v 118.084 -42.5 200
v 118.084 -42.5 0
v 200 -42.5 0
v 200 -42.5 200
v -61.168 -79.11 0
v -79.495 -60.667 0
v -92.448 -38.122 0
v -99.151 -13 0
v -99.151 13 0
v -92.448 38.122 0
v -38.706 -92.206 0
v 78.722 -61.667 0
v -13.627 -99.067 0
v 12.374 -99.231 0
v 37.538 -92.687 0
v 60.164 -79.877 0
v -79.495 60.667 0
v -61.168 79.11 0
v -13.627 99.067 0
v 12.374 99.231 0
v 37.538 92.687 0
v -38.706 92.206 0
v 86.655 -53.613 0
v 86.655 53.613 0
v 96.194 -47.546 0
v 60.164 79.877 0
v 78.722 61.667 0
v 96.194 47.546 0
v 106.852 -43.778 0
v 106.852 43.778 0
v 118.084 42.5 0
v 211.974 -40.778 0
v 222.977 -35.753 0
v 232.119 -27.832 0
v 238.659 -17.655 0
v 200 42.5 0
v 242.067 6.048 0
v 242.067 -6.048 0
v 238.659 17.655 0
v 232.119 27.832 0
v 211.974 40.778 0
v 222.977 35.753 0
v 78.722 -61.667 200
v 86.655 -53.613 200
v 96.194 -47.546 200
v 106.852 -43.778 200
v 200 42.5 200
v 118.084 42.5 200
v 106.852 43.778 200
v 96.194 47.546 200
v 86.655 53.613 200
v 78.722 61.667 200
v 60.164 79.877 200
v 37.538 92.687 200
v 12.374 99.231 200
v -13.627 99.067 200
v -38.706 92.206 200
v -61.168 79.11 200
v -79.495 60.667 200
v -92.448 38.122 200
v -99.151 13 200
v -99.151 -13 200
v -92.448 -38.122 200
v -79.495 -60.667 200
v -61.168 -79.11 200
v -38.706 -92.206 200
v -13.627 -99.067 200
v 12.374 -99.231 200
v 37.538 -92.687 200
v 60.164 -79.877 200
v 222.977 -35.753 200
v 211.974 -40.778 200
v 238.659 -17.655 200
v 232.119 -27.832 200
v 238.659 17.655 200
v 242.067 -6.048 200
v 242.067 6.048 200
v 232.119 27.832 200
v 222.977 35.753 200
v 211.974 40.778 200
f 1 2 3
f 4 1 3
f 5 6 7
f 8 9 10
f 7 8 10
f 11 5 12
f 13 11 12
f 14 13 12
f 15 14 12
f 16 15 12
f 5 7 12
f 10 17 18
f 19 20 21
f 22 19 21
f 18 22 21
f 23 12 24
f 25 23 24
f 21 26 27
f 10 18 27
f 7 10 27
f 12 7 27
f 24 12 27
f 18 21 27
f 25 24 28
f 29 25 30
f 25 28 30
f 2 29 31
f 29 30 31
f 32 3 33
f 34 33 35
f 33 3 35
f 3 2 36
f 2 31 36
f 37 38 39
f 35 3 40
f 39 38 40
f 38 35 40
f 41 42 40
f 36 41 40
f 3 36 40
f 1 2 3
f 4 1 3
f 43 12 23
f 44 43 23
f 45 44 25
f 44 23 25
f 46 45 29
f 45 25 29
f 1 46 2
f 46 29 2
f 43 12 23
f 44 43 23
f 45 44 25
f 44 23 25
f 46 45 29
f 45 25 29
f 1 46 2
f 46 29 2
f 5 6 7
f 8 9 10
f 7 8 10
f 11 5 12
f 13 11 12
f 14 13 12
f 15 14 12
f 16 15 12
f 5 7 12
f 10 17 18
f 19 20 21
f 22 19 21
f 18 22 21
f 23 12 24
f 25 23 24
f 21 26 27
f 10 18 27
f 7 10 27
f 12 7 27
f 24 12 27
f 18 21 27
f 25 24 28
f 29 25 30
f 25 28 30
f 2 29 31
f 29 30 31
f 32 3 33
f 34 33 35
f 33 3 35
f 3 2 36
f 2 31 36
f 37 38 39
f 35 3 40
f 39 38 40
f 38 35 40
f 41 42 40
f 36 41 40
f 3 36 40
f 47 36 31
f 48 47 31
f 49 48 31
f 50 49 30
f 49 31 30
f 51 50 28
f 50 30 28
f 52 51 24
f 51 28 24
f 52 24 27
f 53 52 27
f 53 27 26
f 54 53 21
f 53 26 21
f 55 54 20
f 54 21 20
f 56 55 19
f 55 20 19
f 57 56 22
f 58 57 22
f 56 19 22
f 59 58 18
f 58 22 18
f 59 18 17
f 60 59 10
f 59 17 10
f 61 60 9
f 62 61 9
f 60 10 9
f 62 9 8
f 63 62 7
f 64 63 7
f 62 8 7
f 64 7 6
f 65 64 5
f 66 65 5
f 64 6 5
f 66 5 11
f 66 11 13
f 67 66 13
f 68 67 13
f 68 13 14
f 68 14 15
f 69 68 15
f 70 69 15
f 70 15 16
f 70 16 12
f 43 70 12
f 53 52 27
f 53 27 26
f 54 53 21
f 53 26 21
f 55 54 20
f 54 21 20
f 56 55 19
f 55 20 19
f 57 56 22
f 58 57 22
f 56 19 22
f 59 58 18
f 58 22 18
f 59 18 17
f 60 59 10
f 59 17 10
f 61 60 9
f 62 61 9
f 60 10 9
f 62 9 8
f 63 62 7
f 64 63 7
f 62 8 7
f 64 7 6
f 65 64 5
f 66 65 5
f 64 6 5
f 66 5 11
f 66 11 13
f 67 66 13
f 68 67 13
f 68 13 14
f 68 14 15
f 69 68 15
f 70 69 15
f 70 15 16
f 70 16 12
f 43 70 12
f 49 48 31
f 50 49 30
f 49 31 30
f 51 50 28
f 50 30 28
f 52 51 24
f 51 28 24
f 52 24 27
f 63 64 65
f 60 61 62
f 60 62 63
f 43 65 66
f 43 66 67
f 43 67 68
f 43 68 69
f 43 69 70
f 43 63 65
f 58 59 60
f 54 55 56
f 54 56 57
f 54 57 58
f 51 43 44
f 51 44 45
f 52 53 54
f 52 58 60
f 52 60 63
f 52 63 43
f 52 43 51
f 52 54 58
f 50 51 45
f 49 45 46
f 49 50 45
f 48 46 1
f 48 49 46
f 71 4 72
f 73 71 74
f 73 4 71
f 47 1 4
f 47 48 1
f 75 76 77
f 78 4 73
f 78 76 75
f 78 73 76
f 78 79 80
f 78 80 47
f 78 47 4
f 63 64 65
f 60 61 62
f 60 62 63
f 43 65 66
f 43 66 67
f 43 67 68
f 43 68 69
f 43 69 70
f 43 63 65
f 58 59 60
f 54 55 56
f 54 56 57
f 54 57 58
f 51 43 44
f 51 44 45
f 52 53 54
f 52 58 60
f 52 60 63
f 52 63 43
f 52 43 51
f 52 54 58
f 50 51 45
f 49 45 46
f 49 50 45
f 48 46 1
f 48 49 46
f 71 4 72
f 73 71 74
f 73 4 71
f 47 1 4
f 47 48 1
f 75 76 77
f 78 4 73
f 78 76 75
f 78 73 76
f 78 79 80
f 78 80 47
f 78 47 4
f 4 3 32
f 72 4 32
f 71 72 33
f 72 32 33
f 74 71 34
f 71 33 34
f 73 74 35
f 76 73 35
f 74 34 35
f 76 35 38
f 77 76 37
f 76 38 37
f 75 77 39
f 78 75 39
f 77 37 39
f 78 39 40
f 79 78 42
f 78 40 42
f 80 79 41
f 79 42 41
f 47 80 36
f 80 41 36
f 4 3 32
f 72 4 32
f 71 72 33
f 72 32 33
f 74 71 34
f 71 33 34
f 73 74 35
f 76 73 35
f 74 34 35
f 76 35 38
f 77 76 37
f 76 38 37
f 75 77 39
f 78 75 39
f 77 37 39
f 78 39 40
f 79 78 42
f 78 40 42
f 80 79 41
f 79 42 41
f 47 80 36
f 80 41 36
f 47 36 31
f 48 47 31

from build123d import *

# Parameters (mm, degrees)
F2_DEPTH = 200


# Not quite as in the source:
# - a feature of the source that left no trace in its solid (it failed there, or was rolled back) is left out


with BuildPart() as f2:
    # F1 (on face) → F2 (new body)
    with BuildSketch(Plane.XY):
        with BuildLine():
            Line((200, 42.5), (118.0836567862, 42.5))
            ThreePointArc((118.0836567862, 42.5), (96.1937808919, 47.5463201358), (78.7224378575, 61.6666666667))
            ThreePointArc((78.7224378575, 61.6666666667), (-100, 0), (78.7224378575, -61.6666666667))
            ThreePointArc((78.7224378575, -61.6666666667), (96.1937808919, -47.5463201358), (118.0836567862, -42.5))
            Line((118.0836567862, -42.5), (200, -42.5))
            ThreePointArc((200, -42.5), (242.5, 0), (200, 42.5))
        make_face()
    extrude(amount=F2_DEPTH)


with BuildPart() as f2b:
    # F0 (on Top) → F2, piece 2 (new body)
    with BuildSketch(Plane.XY):
        with BuildLine():
            ThreePointArc((118.0836567862, 42.5), (96.1937808919, 47.5463201358), (78.7224378575, 61.6666666667))
            ThreePointArc((78.7224378575, 61.6666666667), (-100, 0), (78.7224378575, -61.6666666667))
            ThreePointArc((78.7224378575, -61.6666666667), (96.1937808919, -47.5463201358), (118.0836567862, -42.5))
            Line((118.0836567862, -42.5), (200, -42.5))
            ThreePointArc((200, -42.5), (242.5, 0), (200, 42.5))
            Line((200, 42.5), (118.0836567862, 42.5))
        make_face()
    extrude(amount=F2_DEPTH)


solid = Compound([f2.part, f2b.part])
